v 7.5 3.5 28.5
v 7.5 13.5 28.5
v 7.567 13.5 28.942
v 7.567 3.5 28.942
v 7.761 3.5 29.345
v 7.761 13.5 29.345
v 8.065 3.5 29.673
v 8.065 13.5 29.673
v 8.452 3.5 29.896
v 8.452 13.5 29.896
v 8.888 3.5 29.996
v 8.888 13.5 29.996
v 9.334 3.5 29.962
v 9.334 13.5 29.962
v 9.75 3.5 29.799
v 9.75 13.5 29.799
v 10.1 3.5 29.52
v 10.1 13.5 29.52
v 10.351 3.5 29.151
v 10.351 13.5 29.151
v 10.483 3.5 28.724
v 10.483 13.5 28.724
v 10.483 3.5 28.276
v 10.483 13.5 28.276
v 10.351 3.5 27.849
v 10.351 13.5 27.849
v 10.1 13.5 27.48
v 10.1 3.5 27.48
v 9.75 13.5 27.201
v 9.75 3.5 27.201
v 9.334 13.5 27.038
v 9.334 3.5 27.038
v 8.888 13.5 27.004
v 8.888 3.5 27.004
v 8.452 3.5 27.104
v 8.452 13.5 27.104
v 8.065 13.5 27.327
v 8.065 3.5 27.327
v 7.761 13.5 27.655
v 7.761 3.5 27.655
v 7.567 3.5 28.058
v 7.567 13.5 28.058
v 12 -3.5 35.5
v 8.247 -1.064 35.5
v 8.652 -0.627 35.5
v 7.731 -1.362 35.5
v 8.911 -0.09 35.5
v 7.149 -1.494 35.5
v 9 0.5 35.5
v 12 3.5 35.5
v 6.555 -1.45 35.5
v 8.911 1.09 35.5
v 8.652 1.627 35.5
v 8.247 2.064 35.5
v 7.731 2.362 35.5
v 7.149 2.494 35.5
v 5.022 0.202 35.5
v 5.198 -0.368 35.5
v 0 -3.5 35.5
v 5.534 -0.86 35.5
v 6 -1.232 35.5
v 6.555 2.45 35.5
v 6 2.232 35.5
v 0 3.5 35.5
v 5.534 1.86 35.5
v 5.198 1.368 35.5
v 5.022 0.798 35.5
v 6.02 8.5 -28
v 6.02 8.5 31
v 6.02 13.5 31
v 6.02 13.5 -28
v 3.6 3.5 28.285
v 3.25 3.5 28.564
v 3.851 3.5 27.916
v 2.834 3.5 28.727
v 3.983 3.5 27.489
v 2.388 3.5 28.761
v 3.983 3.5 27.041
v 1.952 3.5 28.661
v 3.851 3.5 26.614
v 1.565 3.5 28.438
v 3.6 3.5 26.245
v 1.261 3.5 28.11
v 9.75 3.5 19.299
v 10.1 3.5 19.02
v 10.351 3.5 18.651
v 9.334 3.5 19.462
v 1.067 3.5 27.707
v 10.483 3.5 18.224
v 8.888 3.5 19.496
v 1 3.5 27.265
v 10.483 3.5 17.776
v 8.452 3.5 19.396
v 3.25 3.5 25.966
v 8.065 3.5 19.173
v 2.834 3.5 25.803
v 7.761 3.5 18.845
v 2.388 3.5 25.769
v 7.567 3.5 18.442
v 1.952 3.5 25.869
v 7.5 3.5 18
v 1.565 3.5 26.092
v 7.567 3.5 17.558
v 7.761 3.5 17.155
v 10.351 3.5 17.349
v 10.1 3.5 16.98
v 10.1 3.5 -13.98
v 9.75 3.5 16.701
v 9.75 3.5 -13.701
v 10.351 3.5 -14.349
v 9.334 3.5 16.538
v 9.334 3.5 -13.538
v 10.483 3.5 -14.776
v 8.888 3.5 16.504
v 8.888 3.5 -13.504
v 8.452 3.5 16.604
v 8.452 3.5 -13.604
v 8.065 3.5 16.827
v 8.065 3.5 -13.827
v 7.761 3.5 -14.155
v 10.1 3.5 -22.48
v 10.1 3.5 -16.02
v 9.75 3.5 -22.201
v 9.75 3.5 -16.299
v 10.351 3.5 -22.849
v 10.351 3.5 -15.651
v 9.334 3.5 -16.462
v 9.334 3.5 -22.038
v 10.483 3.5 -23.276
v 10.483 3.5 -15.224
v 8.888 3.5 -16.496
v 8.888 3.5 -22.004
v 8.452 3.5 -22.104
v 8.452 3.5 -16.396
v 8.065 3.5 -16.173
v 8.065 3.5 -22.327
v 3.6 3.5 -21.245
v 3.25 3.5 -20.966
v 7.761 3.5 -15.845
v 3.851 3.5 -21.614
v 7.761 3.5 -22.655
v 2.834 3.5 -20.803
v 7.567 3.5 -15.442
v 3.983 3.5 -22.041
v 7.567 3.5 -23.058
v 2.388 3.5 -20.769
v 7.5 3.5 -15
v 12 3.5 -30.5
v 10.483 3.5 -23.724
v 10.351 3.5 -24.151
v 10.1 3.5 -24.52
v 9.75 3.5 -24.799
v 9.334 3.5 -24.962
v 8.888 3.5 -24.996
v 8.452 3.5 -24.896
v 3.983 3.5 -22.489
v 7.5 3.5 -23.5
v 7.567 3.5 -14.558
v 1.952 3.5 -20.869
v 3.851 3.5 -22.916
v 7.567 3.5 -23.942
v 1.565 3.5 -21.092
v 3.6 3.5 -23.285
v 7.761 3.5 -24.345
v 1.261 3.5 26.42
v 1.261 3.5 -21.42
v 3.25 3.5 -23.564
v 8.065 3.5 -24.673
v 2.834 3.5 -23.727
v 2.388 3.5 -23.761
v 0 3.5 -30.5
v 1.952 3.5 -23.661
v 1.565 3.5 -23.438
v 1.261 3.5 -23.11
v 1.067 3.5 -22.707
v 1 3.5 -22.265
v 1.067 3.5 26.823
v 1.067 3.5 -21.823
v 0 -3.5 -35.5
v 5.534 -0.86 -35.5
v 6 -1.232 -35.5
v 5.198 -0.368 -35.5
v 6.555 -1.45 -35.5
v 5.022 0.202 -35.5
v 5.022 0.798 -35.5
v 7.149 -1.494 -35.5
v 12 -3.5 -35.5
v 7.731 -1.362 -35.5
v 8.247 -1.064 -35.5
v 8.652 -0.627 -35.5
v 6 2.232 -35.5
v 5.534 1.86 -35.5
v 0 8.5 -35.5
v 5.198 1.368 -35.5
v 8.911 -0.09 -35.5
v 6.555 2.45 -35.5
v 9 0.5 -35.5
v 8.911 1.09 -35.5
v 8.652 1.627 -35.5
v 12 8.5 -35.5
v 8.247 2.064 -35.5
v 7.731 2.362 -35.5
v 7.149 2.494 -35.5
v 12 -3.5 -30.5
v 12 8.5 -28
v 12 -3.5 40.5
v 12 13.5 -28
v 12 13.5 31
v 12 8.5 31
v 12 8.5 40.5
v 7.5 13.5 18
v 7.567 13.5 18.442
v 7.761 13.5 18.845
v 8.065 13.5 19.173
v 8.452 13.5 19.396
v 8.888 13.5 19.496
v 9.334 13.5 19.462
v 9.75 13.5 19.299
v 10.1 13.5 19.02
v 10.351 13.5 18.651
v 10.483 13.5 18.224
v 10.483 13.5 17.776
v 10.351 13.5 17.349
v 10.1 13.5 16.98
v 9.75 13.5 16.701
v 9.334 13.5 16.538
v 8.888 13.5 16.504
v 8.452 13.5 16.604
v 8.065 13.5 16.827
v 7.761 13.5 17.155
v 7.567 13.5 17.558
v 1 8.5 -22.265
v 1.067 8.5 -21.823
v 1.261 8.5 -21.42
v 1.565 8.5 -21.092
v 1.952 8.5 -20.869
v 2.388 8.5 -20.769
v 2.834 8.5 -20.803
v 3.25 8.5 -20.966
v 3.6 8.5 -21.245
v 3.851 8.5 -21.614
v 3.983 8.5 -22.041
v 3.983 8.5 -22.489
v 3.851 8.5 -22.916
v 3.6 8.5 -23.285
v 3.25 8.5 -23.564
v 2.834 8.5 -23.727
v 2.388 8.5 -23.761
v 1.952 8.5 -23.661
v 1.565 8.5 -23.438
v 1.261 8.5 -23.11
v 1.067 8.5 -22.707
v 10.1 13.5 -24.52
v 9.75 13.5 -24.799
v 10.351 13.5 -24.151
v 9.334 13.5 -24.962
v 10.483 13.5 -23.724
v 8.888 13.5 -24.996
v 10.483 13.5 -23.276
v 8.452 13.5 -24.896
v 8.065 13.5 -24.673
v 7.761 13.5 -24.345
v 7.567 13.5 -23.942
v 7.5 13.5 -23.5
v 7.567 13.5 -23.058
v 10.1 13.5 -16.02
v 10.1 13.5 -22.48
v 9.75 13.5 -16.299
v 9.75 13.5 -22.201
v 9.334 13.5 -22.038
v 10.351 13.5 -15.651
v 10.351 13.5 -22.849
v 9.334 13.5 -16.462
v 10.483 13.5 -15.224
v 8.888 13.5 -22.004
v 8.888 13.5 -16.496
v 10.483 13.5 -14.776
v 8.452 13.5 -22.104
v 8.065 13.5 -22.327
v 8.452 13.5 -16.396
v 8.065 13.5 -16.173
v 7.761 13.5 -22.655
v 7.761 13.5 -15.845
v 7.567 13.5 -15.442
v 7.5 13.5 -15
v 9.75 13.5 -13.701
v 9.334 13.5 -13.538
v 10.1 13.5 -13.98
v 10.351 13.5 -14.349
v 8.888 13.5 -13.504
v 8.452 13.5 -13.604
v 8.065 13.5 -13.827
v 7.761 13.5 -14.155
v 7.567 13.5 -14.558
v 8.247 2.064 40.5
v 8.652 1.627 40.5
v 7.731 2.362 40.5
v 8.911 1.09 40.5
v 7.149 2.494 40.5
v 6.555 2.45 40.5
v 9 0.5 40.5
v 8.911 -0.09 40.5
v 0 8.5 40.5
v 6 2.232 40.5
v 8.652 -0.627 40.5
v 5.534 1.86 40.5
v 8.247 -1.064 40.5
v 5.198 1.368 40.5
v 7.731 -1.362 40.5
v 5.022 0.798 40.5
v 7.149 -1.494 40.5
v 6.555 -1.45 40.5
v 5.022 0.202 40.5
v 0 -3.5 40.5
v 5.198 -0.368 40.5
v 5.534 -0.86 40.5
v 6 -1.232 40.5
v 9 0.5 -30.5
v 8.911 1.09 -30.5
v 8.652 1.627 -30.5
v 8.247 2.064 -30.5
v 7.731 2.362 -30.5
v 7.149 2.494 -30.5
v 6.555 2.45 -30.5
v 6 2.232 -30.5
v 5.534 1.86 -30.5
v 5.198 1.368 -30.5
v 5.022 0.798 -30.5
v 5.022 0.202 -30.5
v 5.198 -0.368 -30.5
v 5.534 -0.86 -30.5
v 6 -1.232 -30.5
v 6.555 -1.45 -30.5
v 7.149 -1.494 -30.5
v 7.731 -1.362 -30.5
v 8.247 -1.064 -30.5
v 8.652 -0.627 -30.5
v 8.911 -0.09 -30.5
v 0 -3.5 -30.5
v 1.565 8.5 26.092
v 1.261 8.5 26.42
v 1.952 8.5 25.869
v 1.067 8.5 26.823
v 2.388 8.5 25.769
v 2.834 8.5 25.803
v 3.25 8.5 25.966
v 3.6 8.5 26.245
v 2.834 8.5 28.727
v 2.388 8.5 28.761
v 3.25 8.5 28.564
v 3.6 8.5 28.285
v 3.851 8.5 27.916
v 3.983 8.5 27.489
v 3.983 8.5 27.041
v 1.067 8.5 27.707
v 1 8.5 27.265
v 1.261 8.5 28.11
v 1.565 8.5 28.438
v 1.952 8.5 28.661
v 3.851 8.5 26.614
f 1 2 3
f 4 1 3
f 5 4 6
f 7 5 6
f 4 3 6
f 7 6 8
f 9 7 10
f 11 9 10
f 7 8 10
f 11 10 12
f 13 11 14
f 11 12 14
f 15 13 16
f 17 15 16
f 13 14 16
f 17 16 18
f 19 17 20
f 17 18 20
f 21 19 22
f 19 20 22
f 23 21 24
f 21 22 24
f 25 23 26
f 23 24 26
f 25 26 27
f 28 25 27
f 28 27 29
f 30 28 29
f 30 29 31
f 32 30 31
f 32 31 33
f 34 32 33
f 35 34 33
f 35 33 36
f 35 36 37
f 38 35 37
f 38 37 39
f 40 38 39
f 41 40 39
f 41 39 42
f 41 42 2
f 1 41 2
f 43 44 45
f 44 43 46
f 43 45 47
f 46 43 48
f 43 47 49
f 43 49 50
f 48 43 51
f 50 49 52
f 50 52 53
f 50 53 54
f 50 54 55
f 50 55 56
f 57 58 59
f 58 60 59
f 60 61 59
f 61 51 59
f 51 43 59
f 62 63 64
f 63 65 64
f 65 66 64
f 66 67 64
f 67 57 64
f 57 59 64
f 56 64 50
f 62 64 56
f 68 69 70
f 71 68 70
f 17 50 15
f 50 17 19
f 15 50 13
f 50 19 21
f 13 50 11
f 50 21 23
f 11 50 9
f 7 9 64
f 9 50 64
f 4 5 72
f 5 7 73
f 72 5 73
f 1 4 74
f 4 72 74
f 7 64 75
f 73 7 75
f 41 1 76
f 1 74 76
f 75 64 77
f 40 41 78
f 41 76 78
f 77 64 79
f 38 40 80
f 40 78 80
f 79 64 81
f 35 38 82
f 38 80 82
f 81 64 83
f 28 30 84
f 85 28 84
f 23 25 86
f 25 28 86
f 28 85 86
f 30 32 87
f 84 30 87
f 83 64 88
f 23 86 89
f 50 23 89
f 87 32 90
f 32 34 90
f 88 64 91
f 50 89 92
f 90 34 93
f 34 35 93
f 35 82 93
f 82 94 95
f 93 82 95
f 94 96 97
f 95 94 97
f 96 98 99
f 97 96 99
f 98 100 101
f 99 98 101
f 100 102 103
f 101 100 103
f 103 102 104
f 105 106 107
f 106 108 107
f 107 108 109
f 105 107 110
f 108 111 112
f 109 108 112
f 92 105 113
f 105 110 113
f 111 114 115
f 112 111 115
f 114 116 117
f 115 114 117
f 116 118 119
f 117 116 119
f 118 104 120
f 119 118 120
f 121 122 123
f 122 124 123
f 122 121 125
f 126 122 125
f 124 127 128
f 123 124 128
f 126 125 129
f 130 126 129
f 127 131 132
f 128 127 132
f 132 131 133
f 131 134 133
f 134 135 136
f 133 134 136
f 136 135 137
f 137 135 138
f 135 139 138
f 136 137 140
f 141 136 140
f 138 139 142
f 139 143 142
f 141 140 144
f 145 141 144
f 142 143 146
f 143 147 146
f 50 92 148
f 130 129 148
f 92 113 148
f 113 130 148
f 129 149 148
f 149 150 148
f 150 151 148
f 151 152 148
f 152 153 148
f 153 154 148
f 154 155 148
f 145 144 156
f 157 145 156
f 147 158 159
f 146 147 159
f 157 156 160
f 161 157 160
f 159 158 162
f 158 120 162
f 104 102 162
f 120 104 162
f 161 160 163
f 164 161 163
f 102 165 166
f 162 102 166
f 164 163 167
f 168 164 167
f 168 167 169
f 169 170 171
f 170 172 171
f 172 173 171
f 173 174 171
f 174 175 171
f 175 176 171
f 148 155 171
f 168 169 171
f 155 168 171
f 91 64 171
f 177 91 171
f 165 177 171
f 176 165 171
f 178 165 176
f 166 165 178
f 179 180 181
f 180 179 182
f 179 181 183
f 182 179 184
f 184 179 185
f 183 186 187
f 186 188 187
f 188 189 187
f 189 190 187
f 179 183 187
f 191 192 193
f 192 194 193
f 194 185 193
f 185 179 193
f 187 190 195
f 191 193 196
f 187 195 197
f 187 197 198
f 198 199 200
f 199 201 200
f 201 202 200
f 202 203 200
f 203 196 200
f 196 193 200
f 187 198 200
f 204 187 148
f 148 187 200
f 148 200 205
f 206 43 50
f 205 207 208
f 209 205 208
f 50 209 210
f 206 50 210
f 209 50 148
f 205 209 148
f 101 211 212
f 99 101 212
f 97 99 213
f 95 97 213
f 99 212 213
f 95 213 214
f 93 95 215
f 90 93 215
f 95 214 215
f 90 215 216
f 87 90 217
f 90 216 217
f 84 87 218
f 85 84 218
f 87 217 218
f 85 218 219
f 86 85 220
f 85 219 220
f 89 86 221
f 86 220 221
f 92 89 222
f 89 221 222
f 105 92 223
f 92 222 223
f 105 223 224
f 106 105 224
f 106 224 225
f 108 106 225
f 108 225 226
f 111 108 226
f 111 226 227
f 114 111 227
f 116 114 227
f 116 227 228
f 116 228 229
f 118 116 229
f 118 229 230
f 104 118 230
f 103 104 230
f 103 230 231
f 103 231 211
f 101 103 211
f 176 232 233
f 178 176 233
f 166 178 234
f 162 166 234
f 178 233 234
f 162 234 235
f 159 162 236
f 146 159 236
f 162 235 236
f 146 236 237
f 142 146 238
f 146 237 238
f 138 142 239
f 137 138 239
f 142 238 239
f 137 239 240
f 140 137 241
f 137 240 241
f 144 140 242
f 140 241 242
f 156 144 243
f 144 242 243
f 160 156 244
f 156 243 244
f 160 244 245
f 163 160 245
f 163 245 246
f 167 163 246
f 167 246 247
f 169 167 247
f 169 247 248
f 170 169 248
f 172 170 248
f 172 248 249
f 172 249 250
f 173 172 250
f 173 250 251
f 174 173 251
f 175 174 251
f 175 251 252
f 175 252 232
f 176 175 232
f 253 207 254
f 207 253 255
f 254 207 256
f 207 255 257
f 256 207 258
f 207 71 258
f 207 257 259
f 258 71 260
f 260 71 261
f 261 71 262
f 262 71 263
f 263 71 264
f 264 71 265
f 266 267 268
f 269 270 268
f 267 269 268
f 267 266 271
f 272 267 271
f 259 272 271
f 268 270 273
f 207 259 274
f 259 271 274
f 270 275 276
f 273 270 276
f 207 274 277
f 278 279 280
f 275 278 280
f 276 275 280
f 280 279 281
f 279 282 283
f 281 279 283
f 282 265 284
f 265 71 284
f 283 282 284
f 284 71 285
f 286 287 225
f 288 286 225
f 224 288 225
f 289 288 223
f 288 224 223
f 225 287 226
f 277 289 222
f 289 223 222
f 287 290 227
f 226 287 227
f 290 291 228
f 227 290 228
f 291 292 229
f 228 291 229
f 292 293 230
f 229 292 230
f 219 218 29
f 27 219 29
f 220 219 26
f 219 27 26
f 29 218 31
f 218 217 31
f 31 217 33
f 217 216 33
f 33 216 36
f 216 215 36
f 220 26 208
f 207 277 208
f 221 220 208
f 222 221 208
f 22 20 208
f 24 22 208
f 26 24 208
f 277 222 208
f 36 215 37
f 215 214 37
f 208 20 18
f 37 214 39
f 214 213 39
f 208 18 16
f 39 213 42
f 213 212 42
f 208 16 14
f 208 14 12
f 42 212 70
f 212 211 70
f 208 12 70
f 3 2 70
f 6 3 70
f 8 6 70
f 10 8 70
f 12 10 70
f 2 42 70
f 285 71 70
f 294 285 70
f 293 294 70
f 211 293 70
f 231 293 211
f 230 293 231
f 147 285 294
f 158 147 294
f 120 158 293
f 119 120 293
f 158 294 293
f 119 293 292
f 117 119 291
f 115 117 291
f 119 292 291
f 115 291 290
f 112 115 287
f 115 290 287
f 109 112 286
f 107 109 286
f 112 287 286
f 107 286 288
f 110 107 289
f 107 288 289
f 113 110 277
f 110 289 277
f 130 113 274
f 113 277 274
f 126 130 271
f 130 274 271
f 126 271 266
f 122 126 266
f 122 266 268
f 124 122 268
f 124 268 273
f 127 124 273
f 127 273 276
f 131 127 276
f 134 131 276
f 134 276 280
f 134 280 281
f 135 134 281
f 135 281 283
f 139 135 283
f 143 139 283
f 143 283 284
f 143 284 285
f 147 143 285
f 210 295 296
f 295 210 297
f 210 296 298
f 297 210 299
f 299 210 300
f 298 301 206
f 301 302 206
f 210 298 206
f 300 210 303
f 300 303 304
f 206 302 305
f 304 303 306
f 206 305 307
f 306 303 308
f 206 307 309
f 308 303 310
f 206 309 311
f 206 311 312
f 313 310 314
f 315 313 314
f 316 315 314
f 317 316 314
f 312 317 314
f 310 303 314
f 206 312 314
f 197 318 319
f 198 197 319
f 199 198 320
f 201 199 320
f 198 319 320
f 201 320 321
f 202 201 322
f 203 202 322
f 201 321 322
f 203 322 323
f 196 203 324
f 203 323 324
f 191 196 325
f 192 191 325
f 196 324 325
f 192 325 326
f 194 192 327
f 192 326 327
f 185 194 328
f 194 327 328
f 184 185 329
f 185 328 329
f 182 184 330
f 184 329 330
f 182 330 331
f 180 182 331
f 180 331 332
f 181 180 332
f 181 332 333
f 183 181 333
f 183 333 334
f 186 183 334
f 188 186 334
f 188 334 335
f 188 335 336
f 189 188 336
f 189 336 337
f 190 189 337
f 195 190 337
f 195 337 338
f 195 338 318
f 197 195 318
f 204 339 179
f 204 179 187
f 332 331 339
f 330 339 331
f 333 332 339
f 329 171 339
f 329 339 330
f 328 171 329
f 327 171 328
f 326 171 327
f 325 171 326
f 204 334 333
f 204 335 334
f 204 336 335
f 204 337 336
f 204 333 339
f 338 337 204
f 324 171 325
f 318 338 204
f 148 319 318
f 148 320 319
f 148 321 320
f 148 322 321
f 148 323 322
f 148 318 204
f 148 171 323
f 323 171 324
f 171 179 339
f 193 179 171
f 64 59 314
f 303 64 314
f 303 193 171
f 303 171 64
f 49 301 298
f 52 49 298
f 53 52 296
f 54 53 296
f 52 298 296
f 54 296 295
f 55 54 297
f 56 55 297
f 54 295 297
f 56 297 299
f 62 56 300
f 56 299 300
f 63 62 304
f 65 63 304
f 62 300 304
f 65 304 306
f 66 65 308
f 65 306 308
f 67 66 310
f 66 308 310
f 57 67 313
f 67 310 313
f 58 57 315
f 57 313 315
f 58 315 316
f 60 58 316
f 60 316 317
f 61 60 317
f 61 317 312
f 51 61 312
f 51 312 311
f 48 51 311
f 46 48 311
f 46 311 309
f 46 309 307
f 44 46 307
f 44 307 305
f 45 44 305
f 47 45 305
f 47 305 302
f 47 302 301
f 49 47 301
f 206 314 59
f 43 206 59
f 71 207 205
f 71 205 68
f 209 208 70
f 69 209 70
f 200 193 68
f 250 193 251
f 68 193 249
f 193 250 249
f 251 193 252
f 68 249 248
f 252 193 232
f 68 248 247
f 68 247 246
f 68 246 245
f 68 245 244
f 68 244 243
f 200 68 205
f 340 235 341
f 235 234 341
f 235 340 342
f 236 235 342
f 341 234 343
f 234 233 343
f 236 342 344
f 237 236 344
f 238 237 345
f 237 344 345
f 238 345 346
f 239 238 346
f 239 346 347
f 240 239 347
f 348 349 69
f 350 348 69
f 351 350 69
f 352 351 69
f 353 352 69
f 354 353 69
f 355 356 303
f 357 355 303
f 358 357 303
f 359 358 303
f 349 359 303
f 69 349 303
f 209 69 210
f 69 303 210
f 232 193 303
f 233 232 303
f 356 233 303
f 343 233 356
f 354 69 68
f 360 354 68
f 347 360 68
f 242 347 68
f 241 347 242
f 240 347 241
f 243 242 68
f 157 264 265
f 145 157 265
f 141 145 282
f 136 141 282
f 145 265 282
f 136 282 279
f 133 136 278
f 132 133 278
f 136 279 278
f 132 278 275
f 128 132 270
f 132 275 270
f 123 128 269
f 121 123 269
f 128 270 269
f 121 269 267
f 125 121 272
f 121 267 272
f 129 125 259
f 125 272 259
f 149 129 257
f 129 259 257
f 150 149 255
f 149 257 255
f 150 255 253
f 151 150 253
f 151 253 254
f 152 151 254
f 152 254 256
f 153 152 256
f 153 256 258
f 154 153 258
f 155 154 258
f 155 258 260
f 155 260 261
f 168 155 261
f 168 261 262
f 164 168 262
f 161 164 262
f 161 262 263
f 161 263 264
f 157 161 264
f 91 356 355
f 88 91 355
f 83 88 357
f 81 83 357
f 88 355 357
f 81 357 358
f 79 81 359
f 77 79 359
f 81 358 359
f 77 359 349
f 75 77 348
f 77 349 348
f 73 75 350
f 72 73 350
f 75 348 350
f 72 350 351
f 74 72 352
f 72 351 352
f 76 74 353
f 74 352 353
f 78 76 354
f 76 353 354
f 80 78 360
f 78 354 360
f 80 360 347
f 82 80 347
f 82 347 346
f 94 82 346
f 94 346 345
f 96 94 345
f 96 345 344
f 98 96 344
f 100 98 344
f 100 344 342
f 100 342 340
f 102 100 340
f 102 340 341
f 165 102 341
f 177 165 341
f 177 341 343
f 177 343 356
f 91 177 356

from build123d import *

# Parameters (mm, degrees)
F1_DEPTH  = 12
F2_W      = 6.02
F2_H      = 5
F3_DEPTH  = 76
F4_R      = 1.5
F5_DEPTH  = 25
F6_R      = 1.5
F7_DEPTH  = 25
F8_W      = 12
F8_H      = 5
F9_DEPTH  = 7
F10_R     = 2
F11_DEPTH = 76
F12_W     = 5.98
F12_H     = 9.5
F12_H_2   = 7.5
F13_DEPTH = 5
F14_R     = 1.5
F15_DEPTH = 25


# Not quite as in the source:
# - a feature names something its author has since deleted; it is built from what else it names


with BuildPart() as f1:
    # F0 (on Right) → F1 (new body)
    with BuildSketch(Plane.YZ):
        Polygon((13.5, 40.5), (-3.5, 40.5), (-3.5, 35.5), (3.5, 35.5), (3.5, -35.5), (13.5, -35.5), align=None)
    extrude(amount=F1_DEPTH)

    # F2 (on face) → F3 (cut)
    with BuildSketch(Plane.XY.offset(40.5)):
        with Locations((3.01, 11)):
            Rectangle(F2_W, F2_H)
    extrude(amount=-F3_DEPTH, mode=Mode.SUBTRACT)

    # F4 (on face) → F5 (cut)
    with BuildSketch(Plane(origin=(0, 13.5, 0), x_dir=(-1, 0, 0), z_dir=(0, 1, 0))):
        with Locations((-9, 28.5)):
            Circle(F4_R)
        with Locations((-9, -23.5)):
            Circle(F4_R)
    extrude(amount=-F5_DEPTH, mode=Mode.SUBTRACT)

    # F6 (on face) → F7 (cut)
    with BuildSketch(Plane(origin=(0, 8.5, 0), x_dir=(-1, 0, 0), z_dir=(0, 1, 0))):
        with Locations((-2.5, -22.265)):
            Circle(F6_R)
        with Locations((-2.5, 27.265)):
            Circle(F6_R)
    extrude(amount=-F7_DEPTH, mode=Mode.SUBTRACT)

    # F8 (on face) → F9 (join)
    with BuildSketch(Plane.XZ.offset(-3.5)):
        with Locations((6, -33)):
            Rectangle(F8_W, F8_H)
    extrude(amount=F9_DEPTH)

    # F10 (on face) → F11 (cut)
    with BuildSketch(Plane.XY.offset(40.5)):
        with Locations((7, 0.5)):
            Circle(F10_R)
    extrude(amount=-F11_DEPTH, mode=Mode.SUBTRACT)

    # F12 (on face) → F13 (cut)
    with BuildSketch(Plane(origin=(0, 13.5, 0), x_dir=(-1, 0, 0), z_dir=(0, 1, 0))):
        with Locations((-9.01, 35.75)):
            Rectangle(F12_W, F12_H)
        with Locations((-9.01, -31.75)):
            Rectangle(F12_W, F12_H_2)
    extrude(amount=-F13_DEPTH, mode=Mode.SUBTRACT)

    # F14 (on face) → F15 (cut)
    with BuildSketch(Plane(origin=(0, 13.5, 0), x_dir=(-1, 0, 0), z_dir=(0, 1, 0))):
        with Locations((-9, -15)):
            Circle(F14_R)
        with Locations((-9, 18)):
            Circle(F14_R)
    extrude(amount=-F15_DEPTH, mode=Mode.SUBTRACT)


solid = f1.part
